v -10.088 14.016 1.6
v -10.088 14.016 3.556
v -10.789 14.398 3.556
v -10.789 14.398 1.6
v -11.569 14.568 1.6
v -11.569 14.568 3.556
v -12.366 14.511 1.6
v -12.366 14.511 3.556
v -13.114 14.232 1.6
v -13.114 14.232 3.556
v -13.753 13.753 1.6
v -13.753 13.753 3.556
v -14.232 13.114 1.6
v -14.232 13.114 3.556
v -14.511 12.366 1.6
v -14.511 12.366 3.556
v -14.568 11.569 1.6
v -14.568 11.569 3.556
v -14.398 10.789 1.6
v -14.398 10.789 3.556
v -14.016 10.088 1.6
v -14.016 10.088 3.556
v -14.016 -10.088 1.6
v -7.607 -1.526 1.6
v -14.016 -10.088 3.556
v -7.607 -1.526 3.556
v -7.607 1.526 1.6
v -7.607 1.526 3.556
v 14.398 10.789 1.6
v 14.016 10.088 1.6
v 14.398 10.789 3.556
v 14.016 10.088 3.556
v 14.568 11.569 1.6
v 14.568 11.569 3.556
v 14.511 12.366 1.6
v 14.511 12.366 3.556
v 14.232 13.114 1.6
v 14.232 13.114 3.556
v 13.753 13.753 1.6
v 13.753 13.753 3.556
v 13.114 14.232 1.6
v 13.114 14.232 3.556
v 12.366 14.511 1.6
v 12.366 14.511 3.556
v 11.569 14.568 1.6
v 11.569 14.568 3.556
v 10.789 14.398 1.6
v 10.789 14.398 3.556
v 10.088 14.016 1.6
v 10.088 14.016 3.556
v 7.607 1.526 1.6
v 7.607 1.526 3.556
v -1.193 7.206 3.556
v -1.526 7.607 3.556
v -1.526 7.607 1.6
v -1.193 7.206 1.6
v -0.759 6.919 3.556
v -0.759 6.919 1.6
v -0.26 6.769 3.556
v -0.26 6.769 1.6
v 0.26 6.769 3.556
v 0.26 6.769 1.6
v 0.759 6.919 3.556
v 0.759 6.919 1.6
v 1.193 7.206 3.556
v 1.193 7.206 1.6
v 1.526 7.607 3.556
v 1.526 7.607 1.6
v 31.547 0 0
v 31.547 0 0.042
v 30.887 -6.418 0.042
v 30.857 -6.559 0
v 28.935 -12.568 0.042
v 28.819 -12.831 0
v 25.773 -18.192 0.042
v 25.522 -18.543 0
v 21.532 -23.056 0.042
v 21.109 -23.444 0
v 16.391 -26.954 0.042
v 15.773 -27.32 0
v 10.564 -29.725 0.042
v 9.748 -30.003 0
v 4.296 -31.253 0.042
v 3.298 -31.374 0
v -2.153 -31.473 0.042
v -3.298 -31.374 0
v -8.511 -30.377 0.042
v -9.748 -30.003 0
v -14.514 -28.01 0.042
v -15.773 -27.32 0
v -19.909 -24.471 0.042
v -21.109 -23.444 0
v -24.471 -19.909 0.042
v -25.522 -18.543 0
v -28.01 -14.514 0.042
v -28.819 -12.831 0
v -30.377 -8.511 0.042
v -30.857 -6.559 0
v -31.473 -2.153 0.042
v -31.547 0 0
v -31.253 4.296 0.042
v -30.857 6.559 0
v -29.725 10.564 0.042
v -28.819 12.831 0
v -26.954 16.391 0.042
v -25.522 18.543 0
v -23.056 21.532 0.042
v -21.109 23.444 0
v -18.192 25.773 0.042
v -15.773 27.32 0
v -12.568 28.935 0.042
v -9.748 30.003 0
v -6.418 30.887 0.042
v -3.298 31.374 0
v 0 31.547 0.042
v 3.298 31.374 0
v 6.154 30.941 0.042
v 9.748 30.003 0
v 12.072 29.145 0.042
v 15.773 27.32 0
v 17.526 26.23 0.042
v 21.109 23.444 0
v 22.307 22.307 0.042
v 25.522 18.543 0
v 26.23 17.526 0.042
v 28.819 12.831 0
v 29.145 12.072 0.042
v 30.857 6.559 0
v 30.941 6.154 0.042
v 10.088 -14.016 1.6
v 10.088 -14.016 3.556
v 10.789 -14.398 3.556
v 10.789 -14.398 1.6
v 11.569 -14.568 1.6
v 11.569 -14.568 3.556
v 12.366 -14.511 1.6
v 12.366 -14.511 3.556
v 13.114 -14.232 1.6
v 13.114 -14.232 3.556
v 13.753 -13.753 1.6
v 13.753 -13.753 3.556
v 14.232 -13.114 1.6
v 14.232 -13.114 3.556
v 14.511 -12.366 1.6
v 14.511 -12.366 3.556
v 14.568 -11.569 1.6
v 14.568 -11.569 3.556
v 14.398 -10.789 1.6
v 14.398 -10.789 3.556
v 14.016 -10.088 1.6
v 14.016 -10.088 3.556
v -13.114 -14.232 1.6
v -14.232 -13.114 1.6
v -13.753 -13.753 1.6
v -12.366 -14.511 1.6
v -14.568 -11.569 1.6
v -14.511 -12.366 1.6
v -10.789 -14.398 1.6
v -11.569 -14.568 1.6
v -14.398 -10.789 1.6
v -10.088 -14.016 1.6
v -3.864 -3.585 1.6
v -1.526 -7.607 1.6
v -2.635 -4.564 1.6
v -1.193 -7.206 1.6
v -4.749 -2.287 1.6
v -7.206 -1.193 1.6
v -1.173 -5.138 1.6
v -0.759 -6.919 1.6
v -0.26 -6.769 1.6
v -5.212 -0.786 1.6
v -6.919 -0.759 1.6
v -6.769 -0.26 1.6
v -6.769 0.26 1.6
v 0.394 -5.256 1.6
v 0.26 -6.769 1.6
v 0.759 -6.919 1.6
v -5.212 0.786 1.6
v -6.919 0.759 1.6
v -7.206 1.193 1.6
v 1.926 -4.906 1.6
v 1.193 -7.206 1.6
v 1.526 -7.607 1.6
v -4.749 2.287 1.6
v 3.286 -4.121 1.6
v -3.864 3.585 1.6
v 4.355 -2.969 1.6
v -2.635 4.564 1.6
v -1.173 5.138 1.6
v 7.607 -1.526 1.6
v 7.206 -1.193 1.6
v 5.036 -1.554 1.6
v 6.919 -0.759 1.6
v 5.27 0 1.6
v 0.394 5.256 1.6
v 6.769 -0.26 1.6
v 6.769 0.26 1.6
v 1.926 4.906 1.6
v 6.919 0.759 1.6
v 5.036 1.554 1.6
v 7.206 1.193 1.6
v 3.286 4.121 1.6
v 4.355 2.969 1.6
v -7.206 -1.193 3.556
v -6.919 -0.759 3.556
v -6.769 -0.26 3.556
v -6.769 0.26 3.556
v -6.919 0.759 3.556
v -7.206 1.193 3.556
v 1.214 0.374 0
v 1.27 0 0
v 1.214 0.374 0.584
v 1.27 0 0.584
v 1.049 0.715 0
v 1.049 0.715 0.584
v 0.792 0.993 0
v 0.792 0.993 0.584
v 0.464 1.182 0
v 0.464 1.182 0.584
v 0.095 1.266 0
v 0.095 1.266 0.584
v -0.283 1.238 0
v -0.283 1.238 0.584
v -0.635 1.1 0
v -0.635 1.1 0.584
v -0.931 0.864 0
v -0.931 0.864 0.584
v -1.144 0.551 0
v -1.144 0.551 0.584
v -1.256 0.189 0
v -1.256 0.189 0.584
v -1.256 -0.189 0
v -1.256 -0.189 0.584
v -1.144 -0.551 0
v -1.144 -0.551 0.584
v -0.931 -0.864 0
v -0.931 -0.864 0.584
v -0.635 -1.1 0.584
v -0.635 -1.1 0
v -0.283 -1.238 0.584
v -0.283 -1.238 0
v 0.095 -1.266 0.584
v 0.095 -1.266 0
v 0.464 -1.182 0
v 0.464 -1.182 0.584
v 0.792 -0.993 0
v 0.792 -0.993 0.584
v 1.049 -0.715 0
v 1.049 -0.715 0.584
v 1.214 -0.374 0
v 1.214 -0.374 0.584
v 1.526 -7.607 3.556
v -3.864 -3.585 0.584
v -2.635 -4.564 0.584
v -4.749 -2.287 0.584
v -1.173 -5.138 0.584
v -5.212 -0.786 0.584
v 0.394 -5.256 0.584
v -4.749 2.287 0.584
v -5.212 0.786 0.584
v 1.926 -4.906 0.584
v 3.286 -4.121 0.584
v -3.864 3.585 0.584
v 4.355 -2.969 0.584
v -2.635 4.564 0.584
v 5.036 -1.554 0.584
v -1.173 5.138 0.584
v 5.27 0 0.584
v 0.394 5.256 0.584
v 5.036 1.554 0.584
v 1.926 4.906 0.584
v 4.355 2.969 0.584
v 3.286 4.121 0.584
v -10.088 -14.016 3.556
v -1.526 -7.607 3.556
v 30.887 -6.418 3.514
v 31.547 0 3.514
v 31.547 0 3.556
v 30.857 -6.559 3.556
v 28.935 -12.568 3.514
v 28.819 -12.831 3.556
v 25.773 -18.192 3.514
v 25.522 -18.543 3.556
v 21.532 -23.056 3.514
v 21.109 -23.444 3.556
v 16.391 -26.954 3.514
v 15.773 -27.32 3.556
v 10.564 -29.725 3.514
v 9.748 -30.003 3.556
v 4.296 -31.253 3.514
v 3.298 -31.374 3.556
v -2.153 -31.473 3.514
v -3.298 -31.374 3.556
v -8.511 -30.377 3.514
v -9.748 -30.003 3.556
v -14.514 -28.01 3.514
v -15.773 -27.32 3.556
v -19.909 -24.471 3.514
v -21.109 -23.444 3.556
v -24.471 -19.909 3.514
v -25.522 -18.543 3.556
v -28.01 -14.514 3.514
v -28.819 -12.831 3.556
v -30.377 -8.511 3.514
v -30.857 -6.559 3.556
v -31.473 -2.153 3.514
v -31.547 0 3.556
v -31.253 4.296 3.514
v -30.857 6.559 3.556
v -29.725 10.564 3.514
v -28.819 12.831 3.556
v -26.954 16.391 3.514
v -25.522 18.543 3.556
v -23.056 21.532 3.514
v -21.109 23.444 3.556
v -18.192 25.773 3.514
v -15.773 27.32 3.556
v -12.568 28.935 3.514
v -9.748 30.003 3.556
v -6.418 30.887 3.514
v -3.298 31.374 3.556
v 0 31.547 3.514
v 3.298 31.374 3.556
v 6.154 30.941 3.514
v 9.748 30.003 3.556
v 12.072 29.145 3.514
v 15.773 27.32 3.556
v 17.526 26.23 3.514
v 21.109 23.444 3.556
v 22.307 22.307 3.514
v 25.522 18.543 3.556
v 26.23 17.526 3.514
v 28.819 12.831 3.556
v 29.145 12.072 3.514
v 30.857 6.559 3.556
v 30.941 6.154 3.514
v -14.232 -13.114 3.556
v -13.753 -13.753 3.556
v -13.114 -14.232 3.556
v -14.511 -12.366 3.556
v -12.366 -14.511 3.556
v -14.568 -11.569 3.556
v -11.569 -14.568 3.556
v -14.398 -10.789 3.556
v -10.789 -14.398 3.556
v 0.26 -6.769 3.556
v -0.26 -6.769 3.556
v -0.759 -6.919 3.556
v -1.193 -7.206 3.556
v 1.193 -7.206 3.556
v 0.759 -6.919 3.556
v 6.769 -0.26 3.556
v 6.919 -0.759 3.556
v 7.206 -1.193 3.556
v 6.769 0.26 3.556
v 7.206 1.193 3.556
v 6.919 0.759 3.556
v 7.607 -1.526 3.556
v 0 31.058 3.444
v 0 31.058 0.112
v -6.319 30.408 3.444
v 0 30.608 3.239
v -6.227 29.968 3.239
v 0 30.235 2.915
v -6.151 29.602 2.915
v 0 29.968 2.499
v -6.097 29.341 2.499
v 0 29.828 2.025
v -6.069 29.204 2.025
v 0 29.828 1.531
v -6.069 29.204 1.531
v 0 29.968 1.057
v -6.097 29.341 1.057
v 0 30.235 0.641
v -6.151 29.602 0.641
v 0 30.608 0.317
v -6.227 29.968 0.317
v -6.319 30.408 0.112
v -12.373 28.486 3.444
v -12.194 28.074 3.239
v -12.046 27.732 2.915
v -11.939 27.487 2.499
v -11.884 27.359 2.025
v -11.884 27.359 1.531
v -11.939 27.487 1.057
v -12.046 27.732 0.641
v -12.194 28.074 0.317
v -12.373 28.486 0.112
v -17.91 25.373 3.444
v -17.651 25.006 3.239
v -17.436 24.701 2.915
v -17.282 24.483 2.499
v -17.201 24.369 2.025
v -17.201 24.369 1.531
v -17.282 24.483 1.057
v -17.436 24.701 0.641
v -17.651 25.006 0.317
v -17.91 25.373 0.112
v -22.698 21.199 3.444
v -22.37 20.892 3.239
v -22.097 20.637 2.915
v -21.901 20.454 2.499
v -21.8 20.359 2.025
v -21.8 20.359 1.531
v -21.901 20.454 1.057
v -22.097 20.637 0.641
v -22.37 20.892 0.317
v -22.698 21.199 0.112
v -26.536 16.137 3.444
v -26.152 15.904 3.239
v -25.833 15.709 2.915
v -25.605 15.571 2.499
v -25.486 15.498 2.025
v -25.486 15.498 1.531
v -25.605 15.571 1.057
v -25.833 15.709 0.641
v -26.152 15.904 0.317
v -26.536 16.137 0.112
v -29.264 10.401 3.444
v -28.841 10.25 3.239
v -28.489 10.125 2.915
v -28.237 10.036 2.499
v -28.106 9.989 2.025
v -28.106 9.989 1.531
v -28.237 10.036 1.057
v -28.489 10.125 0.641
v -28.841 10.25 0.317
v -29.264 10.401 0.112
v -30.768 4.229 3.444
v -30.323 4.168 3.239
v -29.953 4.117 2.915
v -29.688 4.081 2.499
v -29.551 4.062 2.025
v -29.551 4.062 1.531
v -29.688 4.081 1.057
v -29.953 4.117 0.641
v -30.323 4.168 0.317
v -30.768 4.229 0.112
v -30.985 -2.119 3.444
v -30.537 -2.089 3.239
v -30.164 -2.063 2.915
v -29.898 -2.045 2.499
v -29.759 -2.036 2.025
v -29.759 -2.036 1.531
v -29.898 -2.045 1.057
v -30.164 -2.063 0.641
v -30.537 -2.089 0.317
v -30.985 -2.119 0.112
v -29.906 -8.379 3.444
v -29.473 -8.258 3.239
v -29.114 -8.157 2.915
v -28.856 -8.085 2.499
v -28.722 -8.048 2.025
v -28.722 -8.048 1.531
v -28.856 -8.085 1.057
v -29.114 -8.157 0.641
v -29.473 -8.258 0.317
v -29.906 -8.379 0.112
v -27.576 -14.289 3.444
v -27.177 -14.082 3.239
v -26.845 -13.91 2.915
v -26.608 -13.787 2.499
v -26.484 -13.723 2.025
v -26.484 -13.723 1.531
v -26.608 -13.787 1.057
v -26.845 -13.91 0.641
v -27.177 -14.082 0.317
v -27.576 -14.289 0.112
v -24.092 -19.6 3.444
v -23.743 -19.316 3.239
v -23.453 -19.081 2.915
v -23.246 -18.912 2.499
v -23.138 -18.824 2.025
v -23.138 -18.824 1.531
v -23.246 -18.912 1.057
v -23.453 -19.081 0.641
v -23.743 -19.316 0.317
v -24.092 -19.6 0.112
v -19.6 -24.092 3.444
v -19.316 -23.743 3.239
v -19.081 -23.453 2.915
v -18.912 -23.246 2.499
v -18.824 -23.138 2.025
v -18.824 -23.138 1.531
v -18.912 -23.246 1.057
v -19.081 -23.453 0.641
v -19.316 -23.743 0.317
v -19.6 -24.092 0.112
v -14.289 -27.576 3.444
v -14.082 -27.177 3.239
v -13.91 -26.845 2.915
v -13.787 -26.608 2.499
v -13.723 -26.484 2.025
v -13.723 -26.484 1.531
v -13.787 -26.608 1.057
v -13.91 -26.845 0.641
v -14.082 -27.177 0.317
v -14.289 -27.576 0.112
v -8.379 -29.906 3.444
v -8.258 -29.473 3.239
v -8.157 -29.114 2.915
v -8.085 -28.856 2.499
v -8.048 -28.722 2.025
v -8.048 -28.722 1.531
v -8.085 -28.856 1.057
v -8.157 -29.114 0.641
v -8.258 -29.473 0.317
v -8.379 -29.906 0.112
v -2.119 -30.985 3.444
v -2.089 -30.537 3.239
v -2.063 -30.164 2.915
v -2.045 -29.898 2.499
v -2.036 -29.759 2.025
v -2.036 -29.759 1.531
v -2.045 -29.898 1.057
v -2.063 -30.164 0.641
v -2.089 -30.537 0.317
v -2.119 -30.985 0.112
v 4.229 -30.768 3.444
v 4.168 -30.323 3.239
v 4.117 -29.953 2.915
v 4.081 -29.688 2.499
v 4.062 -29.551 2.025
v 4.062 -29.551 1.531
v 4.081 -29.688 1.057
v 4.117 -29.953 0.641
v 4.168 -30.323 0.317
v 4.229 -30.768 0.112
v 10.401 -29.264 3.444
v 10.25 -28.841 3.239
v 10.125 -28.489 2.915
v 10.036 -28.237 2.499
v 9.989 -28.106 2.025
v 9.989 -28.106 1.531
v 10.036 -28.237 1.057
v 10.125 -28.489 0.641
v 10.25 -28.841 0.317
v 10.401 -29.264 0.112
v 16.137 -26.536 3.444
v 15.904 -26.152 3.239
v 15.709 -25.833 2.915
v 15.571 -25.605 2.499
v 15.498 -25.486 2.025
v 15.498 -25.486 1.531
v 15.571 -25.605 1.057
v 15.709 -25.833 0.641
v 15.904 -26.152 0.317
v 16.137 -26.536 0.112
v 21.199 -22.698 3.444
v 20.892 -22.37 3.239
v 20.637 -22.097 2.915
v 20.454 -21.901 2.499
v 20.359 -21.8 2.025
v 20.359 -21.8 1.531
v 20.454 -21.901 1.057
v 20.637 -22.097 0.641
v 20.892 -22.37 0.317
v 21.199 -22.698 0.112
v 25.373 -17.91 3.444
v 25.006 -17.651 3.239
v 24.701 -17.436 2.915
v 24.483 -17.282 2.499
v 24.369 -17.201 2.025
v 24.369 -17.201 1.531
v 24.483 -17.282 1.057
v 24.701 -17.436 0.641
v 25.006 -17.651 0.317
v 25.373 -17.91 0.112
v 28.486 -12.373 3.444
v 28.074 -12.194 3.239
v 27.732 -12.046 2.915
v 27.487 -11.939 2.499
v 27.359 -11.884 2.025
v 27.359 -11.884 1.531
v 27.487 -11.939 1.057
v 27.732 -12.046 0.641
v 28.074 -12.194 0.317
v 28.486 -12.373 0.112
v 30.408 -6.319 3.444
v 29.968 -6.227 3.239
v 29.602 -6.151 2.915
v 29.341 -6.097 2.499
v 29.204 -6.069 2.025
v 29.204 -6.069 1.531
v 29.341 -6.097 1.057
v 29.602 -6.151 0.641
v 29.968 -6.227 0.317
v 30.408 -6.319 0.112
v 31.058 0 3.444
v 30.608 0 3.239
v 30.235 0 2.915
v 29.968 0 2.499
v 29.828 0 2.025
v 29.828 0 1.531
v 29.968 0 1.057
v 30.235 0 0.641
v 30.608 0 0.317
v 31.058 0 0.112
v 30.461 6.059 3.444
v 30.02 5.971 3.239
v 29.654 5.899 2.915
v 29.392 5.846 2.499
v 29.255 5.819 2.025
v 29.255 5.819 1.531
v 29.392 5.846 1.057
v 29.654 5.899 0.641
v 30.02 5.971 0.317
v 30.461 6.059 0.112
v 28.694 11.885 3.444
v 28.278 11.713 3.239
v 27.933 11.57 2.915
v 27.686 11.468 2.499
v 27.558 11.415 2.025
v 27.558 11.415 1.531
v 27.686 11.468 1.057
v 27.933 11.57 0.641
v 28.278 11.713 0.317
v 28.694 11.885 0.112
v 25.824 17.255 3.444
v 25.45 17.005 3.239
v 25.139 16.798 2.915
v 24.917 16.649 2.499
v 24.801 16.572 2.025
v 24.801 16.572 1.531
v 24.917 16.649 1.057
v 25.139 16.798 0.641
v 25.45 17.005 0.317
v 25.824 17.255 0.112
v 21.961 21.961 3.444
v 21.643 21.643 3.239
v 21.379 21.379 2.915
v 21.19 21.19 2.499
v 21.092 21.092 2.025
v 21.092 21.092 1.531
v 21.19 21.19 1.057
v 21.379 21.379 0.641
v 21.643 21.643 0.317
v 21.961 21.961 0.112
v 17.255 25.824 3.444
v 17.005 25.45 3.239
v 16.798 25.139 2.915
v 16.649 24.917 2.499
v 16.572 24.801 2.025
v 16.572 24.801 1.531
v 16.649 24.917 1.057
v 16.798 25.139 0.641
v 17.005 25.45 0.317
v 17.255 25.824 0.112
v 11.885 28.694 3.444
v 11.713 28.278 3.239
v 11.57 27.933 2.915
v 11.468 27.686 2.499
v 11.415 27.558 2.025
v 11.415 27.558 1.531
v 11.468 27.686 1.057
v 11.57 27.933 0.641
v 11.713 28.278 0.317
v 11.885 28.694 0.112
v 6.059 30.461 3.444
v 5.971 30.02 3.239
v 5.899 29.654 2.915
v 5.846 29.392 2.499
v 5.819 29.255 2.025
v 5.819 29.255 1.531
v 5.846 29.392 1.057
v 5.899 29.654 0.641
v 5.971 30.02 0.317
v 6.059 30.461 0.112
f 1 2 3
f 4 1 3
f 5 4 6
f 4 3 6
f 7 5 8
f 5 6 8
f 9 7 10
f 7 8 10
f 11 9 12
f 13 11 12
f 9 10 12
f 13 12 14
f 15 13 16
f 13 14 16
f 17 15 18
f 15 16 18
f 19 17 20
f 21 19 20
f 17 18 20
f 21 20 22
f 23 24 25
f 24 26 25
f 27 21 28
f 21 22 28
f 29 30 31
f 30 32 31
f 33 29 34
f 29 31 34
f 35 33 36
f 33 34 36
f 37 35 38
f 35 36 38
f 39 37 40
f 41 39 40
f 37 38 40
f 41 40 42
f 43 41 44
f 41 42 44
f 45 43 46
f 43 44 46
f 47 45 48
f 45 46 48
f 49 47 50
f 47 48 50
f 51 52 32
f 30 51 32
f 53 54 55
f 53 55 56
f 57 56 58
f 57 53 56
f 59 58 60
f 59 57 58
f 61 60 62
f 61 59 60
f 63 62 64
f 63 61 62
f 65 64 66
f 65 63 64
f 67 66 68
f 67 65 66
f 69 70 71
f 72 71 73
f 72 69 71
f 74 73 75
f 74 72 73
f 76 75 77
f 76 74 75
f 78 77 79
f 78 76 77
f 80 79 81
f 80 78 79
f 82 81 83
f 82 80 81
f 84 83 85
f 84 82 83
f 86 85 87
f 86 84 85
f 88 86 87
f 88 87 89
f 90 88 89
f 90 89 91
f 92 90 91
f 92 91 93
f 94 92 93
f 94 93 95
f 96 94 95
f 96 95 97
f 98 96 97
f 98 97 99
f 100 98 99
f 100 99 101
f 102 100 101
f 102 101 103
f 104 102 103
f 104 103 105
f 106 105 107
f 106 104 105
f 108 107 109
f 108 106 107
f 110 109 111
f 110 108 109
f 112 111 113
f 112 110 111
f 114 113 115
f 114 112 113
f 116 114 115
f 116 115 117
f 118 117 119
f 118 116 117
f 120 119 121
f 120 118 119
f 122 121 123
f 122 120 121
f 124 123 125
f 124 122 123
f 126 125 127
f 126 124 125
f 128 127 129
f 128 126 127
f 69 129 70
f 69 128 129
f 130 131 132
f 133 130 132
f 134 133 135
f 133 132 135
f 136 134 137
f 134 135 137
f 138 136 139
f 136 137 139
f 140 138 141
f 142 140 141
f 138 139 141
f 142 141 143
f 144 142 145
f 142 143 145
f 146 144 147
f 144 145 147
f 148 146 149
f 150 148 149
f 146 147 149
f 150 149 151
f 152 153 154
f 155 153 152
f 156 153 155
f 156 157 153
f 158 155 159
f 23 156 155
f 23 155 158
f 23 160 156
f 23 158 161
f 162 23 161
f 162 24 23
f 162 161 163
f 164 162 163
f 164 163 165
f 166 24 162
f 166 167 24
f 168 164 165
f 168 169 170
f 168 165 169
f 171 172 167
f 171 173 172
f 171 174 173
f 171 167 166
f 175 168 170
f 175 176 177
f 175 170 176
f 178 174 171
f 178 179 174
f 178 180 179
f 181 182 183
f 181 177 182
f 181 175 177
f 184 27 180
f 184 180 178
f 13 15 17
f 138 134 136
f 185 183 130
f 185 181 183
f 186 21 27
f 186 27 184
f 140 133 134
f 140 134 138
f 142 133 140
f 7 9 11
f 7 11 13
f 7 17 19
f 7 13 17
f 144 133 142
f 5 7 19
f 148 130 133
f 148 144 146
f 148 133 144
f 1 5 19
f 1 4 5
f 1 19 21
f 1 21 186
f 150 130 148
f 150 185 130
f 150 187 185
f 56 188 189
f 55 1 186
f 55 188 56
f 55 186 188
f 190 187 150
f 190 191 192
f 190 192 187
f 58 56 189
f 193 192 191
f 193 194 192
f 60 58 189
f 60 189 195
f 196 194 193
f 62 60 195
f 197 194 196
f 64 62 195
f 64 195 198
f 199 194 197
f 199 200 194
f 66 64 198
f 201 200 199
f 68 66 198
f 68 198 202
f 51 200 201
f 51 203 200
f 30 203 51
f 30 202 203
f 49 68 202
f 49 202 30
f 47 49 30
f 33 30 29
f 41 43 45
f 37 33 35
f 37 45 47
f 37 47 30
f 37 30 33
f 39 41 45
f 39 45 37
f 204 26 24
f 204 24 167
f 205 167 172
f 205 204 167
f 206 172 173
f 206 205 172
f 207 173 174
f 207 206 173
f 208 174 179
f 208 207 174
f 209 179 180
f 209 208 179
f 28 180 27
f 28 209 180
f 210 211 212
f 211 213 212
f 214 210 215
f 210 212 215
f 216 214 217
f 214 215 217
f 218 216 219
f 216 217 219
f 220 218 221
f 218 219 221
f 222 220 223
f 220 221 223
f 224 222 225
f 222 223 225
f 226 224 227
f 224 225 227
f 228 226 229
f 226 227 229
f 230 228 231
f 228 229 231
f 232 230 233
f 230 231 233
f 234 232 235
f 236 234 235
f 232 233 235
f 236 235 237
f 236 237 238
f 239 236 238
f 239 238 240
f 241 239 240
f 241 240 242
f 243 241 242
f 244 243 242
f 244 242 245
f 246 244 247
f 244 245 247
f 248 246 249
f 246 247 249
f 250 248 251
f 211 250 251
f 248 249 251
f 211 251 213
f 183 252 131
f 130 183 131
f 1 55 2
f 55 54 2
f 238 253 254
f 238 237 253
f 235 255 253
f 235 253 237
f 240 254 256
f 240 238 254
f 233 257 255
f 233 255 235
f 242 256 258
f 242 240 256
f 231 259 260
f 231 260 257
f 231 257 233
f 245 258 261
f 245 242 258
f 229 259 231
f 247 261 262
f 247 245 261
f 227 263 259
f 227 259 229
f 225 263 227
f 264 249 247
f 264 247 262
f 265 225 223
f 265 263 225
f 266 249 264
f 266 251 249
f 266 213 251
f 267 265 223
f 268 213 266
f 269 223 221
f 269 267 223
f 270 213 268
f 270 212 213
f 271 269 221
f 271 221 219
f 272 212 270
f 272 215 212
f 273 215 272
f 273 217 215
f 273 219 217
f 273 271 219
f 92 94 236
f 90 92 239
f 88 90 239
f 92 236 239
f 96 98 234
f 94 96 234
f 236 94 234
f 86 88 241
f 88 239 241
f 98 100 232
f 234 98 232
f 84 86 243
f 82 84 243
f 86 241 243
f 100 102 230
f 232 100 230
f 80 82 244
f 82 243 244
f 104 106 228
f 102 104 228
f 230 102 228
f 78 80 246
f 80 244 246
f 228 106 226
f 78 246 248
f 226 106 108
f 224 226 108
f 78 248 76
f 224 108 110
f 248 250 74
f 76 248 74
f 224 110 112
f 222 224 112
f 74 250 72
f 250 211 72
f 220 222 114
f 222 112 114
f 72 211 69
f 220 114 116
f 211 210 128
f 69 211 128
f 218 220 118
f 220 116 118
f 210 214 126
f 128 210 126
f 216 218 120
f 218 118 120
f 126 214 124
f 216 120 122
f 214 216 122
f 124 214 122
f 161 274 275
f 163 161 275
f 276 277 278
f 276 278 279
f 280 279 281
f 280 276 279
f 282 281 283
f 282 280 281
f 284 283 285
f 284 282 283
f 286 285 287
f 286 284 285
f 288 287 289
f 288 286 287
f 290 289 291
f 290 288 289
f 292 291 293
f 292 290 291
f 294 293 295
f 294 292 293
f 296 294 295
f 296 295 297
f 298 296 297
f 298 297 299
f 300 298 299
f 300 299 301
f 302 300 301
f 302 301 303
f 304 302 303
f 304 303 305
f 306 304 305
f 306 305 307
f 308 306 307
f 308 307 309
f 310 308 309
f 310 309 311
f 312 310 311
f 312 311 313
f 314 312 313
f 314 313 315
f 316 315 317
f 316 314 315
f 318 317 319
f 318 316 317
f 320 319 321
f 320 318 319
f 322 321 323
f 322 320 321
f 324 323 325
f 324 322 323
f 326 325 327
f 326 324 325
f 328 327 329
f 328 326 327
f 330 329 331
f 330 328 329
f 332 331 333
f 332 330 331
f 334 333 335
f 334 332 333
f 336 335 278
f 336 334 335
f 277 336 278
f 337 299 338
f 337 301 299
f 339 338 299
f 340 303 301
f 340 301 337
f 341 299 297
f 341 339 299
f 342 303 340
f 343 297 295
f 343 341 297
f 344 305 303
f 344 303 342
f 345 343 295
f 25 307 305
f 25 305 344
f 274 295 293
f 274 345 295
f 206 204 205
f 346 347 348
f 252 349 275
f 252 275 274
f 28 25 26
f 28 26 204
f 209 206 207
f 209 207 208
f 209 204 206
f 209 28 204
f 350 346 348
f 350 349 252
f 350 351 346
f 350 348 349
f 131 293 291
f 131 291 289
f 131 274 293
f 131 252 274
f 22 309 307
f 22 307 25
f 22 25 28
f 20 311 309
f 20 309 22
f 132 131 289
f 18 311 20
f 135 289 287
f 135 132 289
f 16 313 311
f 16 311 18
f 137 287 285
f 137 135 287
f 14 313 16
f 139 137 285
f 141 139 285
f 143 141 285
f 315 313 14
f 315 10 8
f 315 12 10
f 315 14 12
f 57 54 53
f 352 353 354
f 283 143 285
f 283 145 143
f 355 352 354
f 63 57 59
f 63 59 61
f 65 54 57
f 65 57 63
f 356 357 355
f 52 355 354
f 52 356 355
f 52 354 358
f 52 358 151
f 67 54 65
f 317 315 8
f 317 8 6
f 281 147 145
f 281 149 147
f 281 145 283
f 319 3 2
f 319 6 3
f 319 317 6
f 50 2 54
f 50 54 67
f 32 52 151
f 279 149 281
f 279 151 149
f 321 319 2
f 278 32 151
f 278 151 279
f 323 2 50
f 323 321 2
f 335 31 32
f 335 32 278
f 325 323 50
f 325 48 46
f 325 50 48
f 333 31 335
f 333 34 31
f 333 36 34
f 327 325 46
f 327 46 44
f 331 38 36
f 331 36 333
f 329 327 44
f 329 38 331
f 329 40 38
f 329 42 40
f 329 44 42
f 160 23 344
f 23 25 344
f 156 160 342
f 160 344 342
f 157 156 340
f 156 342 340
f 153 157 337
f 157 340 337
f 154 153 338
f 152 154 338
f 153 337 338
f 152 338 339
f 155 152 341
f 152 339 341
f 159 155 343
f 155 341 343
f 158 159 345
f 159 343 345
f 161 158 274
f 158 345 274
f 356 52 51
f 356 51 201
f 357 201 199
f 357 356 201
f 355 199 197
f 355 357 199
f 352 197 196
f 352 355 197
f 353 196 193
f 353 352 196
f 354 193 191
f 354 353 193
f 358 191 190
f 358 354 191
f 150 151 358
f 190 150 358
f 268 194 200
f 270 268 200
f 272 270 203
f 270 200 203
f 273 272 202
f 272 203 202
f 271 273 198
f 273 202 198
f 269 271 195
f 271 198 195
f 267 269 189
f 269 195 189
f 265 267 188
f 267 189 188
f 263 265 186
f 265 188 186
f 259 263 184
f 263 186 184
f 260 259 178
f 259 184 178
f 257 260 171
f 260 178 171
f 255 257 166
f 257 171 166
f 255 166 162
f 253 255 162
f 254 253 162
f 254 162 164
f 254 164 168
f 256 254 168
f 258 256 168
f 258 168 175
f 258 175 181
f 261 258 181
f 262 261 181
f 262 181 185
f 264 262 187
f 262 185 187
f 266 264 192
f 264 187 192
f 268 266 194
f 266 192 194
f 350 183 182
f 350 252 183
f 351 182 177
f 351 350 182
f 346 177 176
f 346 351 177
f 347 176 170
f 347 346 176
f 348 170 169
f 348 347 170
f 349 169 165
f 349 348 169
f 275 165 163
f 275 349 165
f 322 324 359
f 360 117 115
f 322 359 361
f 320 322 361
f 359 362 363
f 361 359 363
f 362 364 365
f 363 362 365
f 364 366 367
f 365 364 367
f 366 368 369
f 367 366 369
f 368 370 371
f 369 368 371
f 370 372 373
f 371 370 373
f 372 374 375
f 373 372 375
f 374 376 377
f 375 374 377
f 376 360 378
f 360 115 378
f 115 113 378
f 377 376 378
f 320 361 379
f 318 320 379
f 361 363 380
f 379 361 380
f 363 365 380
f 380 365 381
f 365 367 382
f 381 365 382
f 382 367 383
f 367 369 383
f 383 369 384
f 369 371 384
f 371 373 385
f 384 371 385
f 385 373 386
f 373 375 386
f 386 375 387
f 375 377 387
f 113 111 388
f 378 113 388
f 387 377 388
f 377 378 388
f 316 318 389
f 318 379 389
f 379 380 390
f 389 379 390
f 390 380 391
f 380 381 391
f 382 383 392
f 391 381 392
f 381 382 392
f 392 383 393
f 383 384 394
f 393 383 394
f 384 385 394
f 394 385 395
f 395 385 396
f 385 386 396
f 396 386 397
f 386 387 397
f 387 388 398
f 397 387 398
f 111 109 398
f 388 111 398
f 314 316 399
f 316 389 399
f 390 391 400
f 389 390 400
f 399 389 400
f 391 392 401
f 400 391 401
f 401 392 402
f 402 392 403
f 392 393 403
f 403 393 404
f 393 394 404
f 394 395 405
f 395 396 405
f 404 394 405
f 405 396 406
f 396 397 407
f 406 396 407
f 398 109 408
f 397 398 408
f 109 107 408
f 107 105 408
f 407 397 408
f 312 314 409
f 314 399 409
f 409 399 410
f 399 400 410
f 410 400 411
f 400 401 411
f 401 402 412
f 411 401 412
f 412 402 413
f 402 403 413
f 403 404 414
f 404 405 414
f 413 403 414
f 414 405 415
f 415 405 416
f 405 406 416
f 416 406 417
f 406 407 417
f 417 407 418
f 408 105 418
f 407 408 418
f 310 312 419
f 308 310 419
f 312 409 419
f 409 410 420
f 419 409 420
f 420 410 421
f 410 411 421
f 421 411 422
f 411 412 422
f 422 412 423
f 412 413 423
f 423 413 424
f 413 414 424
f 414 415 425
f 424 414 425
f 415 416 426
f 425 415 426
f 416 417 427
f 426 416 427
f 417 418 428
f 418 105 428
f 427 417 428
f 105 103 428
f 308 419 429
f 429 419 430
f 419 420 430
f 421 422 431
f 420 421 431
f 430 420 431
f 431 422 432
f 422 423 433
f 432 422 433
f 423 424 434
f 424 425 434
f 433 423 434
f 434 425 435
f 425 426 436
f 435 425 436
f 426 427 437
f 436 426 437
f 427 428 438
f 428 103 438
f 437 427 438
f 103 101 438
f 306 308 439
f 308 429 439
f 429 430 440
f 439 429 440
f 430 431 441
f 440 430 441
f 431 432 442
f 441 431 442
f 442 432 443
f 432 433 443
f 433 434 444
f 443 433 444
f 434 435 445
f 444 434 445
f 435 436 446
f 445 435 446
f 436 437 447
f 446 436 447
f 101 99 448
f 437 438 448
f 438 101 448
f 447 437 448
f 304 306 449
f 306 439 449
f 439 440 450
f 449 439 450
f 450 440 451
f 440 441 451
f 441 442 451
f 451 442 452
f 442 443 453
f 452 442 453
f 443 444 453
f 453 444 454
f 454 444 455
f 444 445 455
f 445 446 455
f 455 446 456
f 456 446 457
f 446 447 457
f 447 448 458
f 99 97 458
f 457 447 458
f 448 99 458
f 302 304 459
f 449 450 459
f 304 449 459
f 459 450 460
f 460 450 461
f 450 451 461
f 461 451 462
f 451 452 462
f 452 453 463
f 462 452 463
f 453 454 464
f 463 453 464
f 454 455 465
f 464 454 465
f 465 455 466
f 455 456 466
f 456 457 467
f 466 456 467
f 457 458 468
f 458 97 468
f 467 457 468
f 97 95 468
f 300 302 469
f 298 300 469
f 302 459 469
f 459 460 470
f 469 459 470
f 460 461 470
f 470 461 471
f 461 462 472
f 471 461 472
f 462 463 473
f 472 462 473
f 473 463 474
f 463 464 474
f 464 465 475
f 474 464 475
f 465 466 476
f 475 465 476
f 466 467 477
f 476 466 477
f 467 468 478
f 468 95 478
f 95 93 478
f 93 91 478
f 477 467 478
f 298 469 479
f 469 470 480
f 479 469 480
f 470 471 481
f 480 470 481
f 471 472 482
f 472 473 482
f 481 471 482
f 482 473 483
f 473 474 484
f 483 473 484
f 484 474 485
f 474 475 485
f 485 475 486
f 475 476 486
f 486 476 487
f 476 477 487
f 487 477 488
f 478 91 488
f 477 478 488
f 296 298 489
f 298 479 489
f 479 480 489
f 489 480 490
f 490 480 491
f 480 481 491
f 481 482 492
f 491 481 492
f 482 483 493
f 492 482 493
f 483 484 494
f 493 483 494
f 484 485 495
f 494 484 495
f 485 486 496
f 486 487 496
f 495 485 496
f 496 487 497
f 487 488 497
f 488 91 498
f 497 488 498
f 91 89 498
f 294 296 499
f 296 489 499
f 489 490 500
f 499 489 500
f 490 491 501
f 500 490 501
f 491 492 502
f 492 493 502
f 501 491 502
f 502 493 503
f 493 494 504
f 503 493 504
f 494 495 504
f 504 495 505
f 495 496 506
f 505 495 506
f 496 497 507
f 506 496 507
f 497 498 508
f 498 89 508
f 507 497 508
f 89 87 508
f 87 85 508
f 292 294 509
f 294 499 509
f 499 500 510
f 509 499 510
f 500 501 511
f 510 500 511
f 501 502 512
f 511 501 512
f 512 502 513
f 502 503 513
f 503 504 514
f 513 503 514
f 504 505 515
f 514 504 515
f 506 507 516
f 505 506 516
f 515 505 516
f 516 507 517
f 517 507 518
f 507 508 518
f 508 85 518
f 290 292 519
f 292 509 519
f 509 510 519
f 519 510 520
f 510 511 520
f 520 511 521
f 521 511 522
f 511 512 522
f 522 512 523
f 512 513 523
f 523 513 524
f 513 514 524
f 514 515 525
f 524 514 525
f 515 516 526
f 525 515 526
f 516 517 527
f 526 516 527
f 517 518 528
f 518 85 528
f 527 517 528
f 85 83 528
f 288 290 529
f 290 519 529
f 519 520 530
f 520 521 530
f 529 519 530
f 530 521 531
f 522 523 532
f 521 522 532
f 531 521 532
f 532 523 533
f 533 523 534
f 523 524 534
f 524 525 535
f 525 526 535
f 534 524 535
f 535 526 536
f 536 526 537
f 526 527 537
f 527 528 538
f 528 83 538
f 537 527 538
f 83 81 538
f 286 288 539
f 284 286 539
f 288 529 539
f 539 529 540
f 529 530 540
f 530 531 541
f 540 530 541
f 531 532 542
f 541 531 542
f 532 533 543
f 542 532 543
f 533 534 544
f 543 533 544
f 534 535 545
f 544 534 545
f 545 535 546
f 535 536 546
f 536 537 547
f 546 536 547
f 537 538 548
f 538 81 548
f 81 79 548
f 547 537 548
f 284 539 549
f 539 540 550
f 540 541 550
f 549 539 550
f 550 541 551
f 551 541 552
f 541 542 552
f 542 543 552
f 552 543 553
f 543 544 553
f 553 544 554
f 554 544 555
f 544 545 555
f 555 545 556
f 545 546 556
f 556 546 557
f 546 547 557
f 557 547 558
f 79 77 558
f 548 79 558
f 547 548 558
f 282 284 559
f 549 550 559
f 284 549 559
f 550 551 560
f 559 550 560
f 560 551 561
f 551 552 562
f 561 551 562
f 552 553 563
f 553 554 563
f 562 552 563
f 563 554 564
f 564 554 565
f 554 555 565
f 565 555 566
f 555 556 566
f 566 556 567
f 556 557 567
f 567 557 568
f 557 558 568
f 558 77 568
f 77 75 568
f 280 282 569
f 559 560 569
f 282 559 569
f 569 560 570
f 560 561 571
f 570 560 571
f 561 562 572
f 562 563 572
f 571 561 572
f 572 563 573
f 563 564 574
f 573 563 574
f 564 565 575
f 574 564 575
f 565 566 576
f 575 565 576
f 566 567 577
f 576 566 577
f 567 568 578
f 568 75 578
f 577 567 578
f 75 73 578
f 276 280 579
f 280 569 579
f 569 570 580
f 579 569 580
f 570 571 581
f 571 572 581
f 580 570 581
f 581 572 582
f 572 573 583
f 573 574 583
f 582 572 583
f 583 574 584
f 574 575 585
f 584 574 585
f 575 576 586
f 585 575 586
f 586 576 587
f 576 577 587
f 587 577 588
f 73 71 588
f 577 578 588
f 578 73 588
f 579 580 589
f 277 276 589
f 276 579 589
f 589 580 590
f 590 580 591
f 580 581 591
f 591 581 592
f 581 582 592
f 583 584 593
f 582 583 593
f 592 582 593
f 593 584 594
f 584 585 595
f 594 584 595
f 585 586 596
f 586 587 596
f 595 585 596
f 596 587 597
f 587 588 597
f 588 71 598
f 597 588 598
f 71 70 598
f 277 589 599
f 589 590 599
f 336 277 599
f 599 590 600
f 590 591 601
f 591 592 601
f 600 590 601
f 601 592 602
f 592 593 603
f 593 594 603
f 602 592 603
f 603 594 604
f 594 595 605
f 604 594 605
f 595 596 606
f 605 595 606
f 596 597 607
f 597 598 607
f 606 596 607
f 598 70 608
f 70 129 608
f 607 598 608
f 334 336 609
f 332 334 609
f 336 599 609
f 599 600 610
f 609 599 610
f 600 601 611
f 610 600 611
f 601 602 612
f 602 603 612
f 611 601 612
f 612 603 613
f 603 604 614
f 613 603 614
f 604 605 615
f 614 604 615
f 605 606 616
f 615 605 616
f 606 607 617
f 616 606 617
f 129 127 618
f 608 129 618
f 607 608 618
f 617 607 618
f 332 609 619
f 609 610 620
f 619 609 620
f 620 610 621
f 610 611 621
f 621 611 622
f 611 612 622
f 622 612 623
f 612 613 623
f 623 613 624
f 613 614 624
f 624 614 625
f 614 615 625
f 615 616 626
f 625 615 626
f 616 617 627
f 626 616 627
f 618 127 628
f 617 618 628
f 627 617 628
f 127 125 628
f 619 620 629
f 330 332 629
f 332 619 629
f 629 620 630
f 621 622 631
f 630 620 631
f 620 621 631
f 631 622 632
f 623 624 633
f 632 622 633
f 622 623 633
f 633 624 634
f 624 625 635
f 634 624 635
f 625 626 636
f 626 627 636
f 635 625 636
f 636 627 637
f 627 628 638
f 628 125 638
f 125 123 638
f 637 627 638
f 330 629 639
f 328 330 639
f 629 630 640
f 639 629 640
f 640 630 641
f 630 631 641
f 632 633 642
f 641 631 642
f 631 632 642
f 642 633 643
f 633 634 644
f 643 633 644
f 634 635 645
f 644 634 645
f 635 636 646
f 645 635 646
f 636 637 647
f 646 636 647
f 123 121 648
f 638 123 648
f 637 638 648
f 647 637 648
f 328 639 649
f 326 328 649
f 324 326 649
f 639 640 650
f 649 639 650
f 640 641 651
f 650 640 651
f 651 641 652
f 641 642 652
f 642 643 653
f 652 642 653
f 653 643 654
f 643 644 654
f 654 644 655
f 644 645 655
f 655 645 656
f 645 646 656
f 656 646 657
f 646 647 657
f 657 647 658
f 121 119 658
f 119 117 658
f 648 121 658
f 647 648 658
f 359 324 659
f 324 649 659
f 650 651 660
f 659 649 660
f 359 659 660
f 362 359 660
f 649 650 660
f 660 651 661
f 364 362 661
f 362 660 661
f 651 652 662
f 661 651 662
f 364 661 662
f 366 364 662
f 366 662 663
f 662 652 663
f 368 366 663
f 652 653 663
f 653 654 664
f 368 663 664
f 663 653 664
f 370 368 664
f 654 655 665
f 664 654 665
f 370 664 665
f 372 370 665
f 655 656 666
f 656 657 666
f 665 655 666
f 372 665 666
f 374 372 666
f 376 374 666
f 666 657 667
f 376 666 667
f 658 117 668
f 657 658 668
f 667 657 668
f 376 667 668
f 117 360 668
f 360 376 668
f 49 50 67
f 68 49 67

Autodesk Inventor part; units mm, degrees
ref_plane "YZ Plane" through (0, 0, 0) normal (1, 0, 0) x (0, 1, 0)
ref_plane "XZ Plane" through (0, 0, 0) normal (0, 1, 0) x (-1, 0, 0)
ref_plane "XY Plane" through (0, 0, 0) normal (0, 0, 1) x (1, 0, 0)
sketch "Sketch1" plane through (0, 0, 0) normal (0, 0, 1) x (1, 0, 0)
  circle A0 centre (0, 0) radius 31.5468
  dimension "d0" = 63.0936
extrude "Extrusion1" add sketch "Sketch1" along normal blind 3.556
sketch "Sketch5" plane through (0, 0, 3.556) normal (0, 0, 1) x (1, 0, 0)
  arc A0 (1.5256, -7.6067) -> (-1.5256, -7.6067) centre (0, -8.5367) ccw
  line L0 (1.5256, -7.6067) -> (10.0877, -14.0155)
  arc A1 (10.0877, -14.0155) -> (14.0155, -10.0877) centre (11.7691, -11.7691) ccw
  line L1 (14.0155, -10.0877) -> (7.6067, -1.5256)
  arc A2 (7.6067, 1.5256) -> (7.6067, -1.5256) centre (8.5367, 0) ccw
  line L2 (7.6067, 1.5256) -> (14.0155, 10.0877)
  arc A3 (14.0155, 10.0877) -> (10.0877, 14.0155) centre (11.7691, 11.7691) ccw
  line L3 (10.0877, 14.0155) -> (1.5256, 7.6067)
  arc A4 (-1.5256, 7.6067) -> (1.5256, 7.6067) centre (0, 8.5367) ccw
  line L4 (-1.5256, 7.6067) -> (-10.0877, 14.0155)
  arc A5 (-10.0877, 14.0155) -> (-14.0155, 10.0877) centre (-11.7691, 11.7691) ccw
  line L5 (-14.0155, 10.0877) -> (-7.6067, 1.5256)
  arc A6 (-7.6067, -1.5256) -> (-7.6067, 1.5256) centre (-8.5367, 0) ccw
  line L6 (-7.6067, -1.5256) -> (-14.0155, -10.0877)
  arc A7 (-14.0155, -10.0877) -> (-10.0877, -14.0155) centre (-11.7691, -11.7691) ccw
  line L7 (-10.0877, -14.0155) -> (-1.5256, -7.6067)
  circle A8 centre (12.339, -12.339) radius 0.75
  circle A9 centre (9.8641, -9.8641) radius 0.75
  circle A10 centre (7.3893, -7.3893) radius 0.75
  circle A11 centre (4.9144, -4.9144) radius 0.75
  circle A12 centre (12.339, 12.339) radius 0.75
  circle A13 centre (9.8641, 9.8641) radius 0.75
  circle A14 centre (7.3893, 7.3893) radius 0.75
  circle A15 centre (4.9144, 4.9144) radius 0.75
  circle A16 centre (-12.339, 12.339) radius 0.75
  circle A17 centre (-9.8641, 9.8641) radius 0.75
  circle A18 centre (-7.3893, 7.3893) radius 0.75
  circle A19 centre (-4.9144, 4.9144) radius 0.75
  circle A20 centre (-12.339, -12.339) radius 0.75
  circle A21 centre (-9.8641, -9.8641) radius 0.75
  circle A22 centre (-7.3893, -7.3893) radius 0.75
  circle A23 centre (-4.9144, -4.9144) radius 0.75
  circle A24 centre (0, 0) radius 3.6
extrude "Extrusion4" cut sketch "Sketch5" against normal blind 1.9558 contours A0 L7 A7 L6 A6 L5 A5 L4 A4 L3 A3 L2 A2 L1 A1 L0 | A8 | A9 | A10 | A11 | A12 | A13 | A14 | A15 | A16 | A17 | A18 | A19 | A20 | A21 | A22 | A23 | A24
sketch "Sketch6" plane through (0, 0, 0) normal (0, 1, 0) x (-1, 0, 0)
  point P0 (0, 0)
sketch "Sketch7" plane through (0, 0, 0) normal (0, 1, 0) x (-1, 0, 0)
  point P0 (0, 0)
sketch "Sketch8" plane through (0, 0, 0) normal (1, 0, 0) x (0, 1, 0)
  line L0 (31.5468, 0) -> (31.5468, 3.556) projected
  circle A0 centre (31.5468, 1.778) radius 1.7361
  line L1 (0, 0) -> (0, 3.556)
  line L2 (31.5468, 3.556) -> (-31.5468, 3.556) projected
revolve "Revolution1" cut sketch "Sketch8" angle 360 about axis through (0, 0, 0) along (0, 0, 1)
sketch "Sketch9" plane through (0, 0, 1.6002) normal (0, 0, 1) x (1, 0, 0)
  circle A0 centre (0, 0) radius 1.27
  circle A1 centre (0, 0) radius 5.2705
extrude "Extrusion5" cut sketch "Sketch9" along normal mid plane 25.4 contours A0
sketch "Sketch10" plane through (0, 0, 3.556) normal (0, 0, 1) x (1, 0, 0)
  point P0 (0, 0)
sketch "Sketch11" plane through (0, 0, 1.6002) normal (0, 0, 1) x (1, 0, 0)
  circle A0 centre (0, 0) radius 5.2705
extrude "Extrusion6" cut sketch "Sketch11" against normal blind 1.016
properties part number "Aidan Sherry Wheel"
